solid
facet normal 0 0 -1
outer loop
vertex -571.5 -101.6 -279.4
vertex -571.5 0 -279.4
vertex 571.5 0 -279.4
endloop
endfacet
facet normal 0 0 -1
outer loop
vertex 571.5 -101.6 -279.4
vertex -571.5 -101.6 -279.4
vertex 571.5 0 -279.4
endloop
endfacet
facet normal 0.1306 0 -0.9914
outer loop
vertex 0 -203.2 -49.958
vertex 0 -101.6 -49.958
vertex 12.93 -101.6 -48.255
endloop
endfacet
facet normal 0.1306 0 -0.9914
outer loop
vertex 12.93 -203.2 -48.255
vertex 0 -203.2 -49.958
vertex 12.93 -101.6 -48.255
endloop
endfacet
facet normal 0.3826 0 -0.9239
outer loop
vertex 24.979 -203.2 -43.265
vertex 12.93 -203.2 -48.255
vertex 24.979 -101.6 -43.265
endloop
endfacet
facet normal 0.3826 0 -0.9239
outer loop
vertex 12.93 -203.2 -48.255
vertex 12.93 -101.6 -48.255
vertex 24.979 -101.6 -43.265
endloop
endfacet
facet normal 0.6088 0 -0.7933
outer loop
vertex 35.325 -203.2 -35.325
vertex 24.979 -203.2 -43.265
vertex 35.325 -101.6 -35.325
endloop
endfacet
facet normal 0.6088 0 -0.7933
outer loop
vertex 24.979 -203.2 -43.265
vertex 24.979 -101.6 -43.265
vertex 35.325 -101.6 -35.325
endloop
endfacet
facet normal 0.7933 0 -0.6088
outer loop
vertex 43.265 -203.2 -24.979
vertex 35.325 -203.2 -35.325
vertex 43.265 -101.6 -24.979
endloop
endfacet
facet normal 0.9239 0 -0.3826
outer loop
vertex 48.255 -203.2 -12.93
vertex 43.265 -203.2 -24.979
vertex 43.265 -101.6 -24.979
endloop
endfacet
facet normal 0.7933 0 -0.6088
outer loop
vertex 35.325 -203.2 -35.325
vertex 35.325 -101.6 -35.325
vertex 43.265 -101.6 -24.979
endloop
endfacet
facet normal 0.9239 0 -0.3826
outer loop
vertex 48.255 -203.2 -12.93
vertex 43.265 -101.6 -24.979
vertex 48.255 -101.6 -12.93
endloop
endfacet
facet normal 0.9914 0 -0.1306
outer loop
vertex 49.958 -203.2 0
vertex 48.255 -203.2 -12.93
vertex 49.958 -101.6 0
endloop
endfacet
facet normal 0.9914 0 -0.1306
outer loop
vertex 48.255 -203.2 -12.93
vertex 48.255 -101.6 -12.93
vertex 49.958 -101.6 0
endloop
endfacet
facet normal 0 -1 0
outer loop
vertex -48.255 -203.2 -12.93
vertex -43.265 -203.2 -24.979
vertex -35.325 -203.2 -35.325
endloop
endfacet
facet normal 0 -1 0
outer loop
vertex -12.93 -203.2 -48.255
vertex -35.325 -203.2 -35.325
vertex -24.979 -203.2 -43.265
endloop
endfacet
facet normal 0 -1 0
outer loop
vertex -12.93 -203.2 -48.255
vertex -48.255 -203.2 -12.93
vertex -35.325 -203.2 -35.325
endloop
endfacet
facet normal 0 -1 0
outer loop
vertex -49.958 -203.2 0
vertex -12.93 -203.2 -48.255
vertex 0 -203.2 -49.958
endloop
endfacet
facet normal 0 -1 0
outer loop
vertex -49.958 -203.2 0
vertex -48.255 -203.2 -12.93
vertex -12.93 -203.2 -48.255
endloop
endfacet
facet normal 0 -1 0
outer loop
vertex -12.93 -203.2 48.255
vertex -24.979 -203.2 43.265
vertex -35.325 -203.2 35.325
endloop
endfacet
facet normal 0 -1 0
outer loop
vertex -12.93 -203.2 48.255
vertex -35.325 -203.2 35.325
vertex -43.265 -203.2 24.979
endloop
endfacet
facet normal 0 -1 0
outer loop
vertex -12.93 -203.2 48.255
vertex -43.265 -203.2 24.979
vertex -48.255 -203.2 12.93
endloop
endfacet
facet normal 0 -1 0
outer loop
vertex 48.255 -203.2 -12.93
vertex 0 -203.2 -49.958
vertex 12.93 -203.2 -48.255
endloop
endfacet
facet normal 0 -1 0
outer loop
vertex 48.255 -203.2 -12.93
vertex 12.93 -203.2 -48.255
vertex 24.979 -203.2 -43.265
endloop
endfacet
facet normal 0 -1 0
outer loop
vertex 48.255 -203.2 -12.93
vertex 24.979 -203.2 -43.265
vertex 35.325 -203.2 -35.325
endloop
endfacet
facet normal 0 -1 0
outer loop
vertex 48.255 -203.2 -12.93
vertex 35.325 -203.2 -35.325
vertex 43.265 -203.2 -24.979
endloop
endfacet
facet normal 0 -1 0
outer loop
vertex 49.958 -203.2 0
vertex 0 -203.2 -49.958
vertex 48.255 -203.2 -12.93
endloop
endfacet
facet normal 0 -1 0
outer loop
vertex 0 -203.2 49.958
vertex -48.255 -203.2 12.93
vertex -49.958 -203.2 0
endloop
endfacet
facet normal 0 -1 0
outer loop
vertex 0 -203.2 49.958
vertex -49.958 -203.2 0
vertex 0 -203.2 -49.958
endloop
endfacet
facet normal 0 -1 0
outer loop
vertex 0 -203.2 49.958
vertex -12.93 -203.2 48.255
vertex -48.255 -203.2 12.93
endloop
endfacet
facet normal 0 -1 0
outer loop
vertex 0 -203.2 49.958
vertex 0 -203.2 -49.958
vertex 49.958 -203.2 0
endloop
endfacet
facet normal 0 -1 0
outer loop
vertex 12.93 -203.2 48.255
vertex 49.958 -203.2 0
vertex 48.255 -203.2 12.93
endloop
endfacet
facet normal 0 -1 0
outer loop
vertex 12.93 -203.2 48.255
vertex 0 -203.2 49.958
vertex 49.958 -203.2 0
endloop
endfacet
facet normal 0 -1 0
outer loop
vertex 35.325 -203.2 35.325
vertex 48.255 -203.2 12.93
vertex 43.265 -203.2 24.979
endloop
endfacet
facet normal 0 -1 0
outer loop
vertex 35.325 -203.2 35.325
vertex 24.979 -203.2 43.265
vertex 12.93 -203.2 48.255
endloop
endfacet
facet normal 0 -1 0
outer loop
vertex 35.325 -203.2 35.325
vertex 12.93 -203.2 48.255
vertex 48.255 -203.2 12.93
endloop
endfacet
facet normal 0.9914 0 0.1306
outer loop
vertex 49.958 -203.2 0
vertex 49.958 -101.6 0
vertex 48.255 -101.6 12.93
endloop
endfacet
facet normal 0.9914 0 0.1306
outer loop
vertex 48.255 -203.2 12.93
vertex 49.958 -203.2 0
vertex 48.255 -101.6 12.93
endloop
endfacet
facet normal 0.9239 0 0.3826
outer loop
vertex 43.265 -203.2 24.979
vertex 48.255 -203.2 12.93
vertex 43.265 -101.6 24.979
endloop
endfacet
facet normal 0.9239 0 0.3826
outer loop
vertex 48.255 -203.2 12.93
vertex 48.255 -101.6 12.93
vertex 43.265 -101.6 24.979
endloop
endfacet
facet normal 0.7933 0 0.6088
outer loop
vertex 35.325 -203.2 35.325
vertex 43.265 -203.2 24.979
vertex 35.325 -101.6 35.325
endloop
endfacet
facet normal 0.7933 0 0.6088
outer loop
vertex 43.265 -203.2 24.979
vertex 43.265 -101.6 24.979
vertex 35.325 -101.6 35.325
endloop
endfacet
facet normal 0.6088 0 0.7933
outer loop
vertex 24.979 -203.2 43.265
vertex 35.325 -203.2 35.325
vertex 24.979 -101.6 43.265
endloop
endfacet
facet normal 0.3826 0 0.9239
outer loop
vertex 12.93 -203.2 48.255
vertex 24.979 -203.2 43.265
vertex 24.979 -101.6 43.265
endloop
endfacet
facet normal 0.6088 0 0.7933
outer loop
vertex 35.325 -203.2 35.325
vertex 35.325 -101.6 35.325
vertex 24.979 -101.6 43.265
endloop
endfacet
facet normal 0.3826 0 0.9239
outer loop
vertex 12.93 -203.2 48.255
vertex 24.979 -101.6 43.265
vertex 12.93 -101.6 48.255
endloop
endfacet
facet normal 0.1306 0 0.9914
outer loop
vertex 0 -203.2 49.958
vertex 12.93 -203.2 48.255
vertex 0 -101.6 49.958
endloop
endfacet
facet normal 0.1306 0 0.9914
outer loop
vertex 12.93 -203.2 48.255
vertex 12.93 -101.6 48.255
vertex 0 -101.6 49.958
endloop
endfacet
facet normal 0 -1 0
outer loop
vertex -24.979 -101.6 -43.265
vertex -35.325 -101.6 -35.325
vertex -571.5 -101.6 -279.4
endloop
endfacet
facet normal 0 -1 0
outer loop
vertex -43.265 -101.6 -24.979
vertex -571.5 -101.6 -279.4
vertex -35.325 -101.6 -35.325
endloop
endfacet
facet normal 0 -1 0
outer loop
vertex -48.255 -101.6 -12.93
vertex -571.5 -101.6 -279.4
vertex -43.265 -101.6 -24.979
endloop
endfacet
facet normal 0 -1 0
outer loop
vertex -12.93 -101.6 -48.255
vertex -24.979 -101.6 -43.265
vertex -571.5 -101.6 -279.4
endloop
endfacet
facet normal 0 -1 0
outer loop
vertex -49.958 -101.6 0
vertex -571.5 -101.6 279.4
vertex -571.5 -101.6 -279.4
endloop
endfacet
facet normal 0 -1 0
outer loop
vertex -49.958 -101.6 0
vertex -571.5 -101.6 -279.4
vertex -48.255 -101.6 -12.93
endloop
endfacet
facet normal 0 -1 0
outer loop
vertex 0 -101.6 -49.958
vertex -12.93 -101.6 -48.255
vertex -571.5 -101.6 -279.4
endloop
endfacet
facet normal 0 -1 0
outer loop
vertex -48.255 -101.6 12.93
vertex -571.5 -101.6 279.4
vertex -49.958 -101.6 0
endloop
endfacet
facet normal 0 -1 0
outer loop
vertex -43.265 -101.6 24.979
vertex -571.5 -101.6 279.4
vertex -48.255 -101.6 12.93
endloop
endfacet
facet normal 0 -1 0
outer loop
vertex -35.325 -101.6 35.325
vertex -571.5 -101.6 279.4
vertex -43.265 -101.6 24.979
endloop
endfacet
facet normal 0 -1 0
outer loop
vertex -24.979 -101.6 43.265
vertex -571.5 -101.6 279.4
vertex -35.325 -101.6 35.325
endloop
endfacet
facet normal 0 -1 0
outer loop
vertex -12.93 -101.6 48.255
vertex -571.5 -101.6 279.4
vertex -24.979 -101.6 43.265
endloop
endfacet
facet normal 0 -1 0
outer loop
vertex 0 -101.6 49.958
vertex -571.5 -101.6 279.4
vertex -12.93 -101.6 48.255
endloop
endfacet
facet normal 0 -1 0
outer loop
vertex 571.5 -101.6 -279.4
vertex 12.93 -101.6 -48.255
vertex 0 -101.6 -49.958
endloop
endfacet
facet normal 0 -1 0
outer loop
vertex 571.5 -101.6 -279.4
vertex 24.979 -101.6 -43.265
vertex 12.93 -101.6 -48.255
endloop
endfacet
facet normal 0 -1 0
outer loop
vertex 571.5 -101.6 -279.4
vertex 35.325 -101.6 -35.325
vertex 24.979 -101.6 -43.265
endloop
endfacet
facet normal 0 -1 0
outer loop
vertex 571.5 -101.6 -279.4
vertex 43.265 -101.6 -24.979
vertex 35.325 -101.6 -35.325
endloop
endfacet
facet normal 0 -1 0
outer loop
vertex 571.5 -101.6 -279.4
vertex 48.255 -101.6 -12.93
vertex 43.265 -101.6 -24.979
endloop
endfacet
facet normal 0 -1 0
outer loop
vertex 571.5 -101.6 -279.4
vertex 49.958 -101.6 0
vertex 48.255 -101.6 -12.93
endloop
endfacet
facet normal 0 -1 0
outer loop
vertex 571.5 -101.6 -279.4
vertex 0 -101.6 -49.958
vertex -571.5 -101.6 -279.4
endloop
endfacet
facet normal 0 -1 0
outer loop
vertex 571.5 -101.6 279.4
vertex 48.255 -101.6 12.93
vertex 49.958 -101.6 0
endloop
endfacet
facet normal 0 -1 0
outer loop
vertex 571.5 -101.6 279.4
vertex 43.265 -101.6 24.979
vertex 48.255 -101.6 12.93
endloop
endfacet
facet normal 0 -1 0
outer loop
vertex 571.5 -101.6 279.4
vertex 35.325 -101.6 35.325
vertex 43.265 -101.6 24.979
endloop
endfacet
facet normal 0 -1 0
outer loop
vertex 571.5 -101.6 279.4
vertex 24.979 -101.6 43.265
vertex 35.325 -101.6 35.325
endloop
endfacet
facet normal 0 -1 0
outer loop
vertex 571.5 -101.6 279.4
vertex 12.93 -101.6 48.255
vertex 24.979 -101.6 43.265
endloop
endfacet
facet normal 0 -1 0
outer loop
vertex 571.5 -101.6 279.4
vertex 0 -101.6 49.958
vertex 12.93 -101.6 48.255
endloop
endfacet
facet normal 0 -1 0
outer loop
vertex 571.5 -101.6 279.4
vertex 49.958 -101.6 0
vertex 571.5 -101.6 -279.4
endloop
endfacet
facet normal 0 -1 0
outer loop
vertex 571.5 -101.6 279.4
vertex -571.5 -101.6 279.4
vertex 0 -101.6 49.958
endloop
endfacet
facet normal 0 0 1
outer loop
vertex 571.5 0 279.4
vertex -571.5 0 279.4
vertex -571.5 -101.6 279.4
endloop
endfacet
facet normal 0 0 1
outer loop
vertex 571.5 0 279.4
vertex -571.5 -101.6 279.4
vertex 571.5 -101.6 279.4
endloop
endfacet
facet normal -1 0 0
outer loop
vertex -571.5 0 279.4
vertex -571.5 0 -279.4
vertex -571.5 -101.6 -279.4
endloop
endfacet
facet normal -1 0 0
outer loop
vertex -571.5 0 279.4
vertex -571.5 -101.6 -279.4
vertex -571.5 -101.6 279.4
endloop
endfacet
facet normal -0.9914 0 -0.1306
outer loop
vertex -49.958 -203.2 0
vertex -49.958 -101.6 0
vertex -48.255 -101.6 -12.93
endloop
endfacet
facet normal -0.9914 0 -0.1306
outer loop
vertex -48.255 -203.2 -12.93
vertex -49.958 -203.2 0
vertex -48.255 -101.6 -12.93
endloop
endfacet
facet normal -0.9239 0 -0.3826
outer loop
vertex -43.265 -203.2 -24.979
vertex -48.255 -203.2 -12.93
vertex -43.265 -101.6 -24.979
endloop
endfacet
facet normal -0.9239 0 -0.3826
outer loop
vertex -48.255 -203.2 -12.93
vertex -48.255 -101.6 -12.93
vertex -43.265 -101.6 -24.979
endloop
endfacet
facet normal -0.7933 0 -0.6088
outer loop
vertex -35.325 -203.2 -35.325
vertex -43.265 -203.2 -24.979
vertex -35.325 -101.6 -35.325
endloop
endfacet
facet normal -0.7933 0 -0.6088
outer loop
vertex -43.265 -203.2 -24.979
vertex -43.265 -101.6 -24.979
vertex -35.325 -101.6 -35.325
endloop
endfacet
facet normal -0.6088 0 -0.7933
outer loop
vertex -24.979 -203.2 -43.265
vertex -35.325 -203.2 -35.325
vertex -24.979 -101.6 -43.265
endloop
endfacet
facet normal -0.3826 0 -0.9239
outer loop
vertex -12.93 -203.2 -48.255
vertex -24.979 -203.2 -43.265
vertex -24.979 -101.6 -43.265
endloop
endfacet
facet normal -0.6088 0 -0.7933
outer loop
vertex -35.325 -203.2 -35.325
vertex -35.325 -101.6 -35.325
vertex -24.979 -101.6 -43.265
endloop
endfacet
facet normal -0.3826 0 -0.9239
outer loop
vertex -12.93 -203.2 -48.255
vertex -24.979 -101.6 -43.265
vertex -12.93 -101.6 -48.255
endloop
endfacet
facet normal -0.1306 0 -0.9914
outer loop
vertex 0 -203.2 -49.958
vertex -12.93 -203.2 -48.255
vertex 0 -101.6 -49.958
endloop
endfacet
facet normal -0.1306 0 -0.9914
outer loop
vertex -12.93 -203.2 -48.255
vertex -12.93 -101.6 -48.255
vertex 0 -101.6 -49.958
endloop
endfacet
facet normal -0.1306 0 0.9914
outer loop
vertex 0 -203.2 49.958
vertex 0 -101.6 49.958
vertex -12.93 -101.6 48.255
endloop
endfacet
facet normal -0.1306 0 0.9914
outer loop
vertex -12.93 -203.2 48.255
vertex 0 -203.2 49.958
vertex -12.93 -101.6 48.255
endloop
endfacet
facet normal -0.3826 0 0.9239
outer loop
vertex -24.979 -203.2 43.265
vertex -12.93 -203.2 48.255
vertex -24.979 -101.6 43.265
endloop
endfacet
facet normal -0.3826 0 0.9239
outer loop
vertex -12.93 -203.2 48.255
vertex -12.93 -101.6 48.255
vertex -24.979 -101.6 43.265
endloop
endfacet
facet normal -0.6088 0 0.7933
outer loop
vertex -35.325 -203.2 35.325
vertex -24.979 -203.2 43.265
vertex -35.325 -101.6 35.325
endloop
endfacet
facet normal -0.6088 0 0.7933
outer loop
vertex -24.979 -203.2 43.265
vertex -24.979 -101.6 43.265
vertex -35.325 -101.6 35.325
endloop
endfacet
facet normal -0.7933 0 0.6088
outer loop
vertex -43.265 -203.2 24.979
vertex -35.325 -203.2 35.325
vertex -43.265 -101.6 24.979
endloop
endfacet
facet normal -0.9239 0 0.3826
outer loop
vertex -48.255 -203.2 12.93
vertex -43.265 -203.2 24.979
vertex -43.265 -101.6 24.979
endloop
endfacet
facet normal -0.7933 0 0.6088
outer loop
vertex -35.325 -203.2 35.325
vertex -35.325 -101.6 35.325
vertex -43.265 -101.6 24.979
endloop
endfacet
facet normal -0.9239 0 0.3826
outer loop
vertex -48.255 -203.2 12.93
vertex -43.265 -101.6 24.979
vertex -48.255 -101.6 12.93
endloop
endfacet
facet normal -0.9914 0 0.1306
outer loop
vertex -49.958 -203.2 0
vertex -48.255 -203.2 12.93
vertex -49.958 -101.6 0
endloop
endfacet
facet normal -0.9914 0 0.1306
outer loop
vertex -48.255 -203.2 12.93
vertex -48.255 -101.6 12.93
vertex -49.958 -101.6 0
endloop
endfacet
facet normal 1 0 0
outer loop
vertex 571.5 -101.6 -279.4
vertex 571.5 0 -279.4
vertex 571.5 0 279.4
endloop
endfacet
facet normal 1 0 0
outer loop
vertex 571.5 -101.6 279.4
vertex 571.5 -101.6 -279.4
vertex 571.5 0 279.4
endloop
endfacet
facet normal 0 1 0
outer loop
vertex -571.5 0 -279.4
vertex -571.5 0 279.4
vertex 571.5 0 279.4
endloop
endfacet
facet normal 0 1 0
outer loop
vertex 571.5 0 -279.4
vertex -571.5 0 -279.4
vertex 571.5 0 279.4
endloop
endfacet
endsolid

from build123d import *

# Parameters (mm, degrees)
F0_W     = 1143
F0_H     = 558.8
F1_DEPTH = 101.6
F3_DEPTH = 101.6


with BuildPart() as f1:
    # F0 (on Front) → F1 (new body)
    with BuildSketch(Plane.XZ):
        Rectangle(F0_W, F0_H)
    extrude(amount=F1_DEPTH)

    # F2 (on face) → F3 (join)
    with BuildSketch(Plane.XZ.offset(101.6)):
        with BuildLine():
            Line((0, 0), (49.957755, 0))
            ThreePointArc((49.957755, 0), (35.325468, 35.325468), (0, 49.957755))
            Line((0, 49.957755), (0, 0))
        make_face()
        with BuildLine():
            ThreePointArc((0, -49.957755), (35.325468, -35.325468), (49.957755, 0))
            Line((49.957755, 0), (0, 0))
            Line((0, 0), (0, -49.957755))
        make_face()
        with BuildLine():
            Line((0, 0), (0, 49.957755))
            ThreePointArc((0, 49.957755), (-35.325468, 35.325468), (-49.957755, 0))
            Line((-49.957755, 0), (0, 0))
        make_face()
        with BuildLine():
            ThreePointArc((-49.957755, 0), (-35.325468, -35.325468), (0, -49.957755))
            Line((0, -49.957755), (0, 0))
            Line((0, 0), (-49.957755, 0))
        make_face()
    extrude(amount=F3_DEPTH)


solid = f1.part
